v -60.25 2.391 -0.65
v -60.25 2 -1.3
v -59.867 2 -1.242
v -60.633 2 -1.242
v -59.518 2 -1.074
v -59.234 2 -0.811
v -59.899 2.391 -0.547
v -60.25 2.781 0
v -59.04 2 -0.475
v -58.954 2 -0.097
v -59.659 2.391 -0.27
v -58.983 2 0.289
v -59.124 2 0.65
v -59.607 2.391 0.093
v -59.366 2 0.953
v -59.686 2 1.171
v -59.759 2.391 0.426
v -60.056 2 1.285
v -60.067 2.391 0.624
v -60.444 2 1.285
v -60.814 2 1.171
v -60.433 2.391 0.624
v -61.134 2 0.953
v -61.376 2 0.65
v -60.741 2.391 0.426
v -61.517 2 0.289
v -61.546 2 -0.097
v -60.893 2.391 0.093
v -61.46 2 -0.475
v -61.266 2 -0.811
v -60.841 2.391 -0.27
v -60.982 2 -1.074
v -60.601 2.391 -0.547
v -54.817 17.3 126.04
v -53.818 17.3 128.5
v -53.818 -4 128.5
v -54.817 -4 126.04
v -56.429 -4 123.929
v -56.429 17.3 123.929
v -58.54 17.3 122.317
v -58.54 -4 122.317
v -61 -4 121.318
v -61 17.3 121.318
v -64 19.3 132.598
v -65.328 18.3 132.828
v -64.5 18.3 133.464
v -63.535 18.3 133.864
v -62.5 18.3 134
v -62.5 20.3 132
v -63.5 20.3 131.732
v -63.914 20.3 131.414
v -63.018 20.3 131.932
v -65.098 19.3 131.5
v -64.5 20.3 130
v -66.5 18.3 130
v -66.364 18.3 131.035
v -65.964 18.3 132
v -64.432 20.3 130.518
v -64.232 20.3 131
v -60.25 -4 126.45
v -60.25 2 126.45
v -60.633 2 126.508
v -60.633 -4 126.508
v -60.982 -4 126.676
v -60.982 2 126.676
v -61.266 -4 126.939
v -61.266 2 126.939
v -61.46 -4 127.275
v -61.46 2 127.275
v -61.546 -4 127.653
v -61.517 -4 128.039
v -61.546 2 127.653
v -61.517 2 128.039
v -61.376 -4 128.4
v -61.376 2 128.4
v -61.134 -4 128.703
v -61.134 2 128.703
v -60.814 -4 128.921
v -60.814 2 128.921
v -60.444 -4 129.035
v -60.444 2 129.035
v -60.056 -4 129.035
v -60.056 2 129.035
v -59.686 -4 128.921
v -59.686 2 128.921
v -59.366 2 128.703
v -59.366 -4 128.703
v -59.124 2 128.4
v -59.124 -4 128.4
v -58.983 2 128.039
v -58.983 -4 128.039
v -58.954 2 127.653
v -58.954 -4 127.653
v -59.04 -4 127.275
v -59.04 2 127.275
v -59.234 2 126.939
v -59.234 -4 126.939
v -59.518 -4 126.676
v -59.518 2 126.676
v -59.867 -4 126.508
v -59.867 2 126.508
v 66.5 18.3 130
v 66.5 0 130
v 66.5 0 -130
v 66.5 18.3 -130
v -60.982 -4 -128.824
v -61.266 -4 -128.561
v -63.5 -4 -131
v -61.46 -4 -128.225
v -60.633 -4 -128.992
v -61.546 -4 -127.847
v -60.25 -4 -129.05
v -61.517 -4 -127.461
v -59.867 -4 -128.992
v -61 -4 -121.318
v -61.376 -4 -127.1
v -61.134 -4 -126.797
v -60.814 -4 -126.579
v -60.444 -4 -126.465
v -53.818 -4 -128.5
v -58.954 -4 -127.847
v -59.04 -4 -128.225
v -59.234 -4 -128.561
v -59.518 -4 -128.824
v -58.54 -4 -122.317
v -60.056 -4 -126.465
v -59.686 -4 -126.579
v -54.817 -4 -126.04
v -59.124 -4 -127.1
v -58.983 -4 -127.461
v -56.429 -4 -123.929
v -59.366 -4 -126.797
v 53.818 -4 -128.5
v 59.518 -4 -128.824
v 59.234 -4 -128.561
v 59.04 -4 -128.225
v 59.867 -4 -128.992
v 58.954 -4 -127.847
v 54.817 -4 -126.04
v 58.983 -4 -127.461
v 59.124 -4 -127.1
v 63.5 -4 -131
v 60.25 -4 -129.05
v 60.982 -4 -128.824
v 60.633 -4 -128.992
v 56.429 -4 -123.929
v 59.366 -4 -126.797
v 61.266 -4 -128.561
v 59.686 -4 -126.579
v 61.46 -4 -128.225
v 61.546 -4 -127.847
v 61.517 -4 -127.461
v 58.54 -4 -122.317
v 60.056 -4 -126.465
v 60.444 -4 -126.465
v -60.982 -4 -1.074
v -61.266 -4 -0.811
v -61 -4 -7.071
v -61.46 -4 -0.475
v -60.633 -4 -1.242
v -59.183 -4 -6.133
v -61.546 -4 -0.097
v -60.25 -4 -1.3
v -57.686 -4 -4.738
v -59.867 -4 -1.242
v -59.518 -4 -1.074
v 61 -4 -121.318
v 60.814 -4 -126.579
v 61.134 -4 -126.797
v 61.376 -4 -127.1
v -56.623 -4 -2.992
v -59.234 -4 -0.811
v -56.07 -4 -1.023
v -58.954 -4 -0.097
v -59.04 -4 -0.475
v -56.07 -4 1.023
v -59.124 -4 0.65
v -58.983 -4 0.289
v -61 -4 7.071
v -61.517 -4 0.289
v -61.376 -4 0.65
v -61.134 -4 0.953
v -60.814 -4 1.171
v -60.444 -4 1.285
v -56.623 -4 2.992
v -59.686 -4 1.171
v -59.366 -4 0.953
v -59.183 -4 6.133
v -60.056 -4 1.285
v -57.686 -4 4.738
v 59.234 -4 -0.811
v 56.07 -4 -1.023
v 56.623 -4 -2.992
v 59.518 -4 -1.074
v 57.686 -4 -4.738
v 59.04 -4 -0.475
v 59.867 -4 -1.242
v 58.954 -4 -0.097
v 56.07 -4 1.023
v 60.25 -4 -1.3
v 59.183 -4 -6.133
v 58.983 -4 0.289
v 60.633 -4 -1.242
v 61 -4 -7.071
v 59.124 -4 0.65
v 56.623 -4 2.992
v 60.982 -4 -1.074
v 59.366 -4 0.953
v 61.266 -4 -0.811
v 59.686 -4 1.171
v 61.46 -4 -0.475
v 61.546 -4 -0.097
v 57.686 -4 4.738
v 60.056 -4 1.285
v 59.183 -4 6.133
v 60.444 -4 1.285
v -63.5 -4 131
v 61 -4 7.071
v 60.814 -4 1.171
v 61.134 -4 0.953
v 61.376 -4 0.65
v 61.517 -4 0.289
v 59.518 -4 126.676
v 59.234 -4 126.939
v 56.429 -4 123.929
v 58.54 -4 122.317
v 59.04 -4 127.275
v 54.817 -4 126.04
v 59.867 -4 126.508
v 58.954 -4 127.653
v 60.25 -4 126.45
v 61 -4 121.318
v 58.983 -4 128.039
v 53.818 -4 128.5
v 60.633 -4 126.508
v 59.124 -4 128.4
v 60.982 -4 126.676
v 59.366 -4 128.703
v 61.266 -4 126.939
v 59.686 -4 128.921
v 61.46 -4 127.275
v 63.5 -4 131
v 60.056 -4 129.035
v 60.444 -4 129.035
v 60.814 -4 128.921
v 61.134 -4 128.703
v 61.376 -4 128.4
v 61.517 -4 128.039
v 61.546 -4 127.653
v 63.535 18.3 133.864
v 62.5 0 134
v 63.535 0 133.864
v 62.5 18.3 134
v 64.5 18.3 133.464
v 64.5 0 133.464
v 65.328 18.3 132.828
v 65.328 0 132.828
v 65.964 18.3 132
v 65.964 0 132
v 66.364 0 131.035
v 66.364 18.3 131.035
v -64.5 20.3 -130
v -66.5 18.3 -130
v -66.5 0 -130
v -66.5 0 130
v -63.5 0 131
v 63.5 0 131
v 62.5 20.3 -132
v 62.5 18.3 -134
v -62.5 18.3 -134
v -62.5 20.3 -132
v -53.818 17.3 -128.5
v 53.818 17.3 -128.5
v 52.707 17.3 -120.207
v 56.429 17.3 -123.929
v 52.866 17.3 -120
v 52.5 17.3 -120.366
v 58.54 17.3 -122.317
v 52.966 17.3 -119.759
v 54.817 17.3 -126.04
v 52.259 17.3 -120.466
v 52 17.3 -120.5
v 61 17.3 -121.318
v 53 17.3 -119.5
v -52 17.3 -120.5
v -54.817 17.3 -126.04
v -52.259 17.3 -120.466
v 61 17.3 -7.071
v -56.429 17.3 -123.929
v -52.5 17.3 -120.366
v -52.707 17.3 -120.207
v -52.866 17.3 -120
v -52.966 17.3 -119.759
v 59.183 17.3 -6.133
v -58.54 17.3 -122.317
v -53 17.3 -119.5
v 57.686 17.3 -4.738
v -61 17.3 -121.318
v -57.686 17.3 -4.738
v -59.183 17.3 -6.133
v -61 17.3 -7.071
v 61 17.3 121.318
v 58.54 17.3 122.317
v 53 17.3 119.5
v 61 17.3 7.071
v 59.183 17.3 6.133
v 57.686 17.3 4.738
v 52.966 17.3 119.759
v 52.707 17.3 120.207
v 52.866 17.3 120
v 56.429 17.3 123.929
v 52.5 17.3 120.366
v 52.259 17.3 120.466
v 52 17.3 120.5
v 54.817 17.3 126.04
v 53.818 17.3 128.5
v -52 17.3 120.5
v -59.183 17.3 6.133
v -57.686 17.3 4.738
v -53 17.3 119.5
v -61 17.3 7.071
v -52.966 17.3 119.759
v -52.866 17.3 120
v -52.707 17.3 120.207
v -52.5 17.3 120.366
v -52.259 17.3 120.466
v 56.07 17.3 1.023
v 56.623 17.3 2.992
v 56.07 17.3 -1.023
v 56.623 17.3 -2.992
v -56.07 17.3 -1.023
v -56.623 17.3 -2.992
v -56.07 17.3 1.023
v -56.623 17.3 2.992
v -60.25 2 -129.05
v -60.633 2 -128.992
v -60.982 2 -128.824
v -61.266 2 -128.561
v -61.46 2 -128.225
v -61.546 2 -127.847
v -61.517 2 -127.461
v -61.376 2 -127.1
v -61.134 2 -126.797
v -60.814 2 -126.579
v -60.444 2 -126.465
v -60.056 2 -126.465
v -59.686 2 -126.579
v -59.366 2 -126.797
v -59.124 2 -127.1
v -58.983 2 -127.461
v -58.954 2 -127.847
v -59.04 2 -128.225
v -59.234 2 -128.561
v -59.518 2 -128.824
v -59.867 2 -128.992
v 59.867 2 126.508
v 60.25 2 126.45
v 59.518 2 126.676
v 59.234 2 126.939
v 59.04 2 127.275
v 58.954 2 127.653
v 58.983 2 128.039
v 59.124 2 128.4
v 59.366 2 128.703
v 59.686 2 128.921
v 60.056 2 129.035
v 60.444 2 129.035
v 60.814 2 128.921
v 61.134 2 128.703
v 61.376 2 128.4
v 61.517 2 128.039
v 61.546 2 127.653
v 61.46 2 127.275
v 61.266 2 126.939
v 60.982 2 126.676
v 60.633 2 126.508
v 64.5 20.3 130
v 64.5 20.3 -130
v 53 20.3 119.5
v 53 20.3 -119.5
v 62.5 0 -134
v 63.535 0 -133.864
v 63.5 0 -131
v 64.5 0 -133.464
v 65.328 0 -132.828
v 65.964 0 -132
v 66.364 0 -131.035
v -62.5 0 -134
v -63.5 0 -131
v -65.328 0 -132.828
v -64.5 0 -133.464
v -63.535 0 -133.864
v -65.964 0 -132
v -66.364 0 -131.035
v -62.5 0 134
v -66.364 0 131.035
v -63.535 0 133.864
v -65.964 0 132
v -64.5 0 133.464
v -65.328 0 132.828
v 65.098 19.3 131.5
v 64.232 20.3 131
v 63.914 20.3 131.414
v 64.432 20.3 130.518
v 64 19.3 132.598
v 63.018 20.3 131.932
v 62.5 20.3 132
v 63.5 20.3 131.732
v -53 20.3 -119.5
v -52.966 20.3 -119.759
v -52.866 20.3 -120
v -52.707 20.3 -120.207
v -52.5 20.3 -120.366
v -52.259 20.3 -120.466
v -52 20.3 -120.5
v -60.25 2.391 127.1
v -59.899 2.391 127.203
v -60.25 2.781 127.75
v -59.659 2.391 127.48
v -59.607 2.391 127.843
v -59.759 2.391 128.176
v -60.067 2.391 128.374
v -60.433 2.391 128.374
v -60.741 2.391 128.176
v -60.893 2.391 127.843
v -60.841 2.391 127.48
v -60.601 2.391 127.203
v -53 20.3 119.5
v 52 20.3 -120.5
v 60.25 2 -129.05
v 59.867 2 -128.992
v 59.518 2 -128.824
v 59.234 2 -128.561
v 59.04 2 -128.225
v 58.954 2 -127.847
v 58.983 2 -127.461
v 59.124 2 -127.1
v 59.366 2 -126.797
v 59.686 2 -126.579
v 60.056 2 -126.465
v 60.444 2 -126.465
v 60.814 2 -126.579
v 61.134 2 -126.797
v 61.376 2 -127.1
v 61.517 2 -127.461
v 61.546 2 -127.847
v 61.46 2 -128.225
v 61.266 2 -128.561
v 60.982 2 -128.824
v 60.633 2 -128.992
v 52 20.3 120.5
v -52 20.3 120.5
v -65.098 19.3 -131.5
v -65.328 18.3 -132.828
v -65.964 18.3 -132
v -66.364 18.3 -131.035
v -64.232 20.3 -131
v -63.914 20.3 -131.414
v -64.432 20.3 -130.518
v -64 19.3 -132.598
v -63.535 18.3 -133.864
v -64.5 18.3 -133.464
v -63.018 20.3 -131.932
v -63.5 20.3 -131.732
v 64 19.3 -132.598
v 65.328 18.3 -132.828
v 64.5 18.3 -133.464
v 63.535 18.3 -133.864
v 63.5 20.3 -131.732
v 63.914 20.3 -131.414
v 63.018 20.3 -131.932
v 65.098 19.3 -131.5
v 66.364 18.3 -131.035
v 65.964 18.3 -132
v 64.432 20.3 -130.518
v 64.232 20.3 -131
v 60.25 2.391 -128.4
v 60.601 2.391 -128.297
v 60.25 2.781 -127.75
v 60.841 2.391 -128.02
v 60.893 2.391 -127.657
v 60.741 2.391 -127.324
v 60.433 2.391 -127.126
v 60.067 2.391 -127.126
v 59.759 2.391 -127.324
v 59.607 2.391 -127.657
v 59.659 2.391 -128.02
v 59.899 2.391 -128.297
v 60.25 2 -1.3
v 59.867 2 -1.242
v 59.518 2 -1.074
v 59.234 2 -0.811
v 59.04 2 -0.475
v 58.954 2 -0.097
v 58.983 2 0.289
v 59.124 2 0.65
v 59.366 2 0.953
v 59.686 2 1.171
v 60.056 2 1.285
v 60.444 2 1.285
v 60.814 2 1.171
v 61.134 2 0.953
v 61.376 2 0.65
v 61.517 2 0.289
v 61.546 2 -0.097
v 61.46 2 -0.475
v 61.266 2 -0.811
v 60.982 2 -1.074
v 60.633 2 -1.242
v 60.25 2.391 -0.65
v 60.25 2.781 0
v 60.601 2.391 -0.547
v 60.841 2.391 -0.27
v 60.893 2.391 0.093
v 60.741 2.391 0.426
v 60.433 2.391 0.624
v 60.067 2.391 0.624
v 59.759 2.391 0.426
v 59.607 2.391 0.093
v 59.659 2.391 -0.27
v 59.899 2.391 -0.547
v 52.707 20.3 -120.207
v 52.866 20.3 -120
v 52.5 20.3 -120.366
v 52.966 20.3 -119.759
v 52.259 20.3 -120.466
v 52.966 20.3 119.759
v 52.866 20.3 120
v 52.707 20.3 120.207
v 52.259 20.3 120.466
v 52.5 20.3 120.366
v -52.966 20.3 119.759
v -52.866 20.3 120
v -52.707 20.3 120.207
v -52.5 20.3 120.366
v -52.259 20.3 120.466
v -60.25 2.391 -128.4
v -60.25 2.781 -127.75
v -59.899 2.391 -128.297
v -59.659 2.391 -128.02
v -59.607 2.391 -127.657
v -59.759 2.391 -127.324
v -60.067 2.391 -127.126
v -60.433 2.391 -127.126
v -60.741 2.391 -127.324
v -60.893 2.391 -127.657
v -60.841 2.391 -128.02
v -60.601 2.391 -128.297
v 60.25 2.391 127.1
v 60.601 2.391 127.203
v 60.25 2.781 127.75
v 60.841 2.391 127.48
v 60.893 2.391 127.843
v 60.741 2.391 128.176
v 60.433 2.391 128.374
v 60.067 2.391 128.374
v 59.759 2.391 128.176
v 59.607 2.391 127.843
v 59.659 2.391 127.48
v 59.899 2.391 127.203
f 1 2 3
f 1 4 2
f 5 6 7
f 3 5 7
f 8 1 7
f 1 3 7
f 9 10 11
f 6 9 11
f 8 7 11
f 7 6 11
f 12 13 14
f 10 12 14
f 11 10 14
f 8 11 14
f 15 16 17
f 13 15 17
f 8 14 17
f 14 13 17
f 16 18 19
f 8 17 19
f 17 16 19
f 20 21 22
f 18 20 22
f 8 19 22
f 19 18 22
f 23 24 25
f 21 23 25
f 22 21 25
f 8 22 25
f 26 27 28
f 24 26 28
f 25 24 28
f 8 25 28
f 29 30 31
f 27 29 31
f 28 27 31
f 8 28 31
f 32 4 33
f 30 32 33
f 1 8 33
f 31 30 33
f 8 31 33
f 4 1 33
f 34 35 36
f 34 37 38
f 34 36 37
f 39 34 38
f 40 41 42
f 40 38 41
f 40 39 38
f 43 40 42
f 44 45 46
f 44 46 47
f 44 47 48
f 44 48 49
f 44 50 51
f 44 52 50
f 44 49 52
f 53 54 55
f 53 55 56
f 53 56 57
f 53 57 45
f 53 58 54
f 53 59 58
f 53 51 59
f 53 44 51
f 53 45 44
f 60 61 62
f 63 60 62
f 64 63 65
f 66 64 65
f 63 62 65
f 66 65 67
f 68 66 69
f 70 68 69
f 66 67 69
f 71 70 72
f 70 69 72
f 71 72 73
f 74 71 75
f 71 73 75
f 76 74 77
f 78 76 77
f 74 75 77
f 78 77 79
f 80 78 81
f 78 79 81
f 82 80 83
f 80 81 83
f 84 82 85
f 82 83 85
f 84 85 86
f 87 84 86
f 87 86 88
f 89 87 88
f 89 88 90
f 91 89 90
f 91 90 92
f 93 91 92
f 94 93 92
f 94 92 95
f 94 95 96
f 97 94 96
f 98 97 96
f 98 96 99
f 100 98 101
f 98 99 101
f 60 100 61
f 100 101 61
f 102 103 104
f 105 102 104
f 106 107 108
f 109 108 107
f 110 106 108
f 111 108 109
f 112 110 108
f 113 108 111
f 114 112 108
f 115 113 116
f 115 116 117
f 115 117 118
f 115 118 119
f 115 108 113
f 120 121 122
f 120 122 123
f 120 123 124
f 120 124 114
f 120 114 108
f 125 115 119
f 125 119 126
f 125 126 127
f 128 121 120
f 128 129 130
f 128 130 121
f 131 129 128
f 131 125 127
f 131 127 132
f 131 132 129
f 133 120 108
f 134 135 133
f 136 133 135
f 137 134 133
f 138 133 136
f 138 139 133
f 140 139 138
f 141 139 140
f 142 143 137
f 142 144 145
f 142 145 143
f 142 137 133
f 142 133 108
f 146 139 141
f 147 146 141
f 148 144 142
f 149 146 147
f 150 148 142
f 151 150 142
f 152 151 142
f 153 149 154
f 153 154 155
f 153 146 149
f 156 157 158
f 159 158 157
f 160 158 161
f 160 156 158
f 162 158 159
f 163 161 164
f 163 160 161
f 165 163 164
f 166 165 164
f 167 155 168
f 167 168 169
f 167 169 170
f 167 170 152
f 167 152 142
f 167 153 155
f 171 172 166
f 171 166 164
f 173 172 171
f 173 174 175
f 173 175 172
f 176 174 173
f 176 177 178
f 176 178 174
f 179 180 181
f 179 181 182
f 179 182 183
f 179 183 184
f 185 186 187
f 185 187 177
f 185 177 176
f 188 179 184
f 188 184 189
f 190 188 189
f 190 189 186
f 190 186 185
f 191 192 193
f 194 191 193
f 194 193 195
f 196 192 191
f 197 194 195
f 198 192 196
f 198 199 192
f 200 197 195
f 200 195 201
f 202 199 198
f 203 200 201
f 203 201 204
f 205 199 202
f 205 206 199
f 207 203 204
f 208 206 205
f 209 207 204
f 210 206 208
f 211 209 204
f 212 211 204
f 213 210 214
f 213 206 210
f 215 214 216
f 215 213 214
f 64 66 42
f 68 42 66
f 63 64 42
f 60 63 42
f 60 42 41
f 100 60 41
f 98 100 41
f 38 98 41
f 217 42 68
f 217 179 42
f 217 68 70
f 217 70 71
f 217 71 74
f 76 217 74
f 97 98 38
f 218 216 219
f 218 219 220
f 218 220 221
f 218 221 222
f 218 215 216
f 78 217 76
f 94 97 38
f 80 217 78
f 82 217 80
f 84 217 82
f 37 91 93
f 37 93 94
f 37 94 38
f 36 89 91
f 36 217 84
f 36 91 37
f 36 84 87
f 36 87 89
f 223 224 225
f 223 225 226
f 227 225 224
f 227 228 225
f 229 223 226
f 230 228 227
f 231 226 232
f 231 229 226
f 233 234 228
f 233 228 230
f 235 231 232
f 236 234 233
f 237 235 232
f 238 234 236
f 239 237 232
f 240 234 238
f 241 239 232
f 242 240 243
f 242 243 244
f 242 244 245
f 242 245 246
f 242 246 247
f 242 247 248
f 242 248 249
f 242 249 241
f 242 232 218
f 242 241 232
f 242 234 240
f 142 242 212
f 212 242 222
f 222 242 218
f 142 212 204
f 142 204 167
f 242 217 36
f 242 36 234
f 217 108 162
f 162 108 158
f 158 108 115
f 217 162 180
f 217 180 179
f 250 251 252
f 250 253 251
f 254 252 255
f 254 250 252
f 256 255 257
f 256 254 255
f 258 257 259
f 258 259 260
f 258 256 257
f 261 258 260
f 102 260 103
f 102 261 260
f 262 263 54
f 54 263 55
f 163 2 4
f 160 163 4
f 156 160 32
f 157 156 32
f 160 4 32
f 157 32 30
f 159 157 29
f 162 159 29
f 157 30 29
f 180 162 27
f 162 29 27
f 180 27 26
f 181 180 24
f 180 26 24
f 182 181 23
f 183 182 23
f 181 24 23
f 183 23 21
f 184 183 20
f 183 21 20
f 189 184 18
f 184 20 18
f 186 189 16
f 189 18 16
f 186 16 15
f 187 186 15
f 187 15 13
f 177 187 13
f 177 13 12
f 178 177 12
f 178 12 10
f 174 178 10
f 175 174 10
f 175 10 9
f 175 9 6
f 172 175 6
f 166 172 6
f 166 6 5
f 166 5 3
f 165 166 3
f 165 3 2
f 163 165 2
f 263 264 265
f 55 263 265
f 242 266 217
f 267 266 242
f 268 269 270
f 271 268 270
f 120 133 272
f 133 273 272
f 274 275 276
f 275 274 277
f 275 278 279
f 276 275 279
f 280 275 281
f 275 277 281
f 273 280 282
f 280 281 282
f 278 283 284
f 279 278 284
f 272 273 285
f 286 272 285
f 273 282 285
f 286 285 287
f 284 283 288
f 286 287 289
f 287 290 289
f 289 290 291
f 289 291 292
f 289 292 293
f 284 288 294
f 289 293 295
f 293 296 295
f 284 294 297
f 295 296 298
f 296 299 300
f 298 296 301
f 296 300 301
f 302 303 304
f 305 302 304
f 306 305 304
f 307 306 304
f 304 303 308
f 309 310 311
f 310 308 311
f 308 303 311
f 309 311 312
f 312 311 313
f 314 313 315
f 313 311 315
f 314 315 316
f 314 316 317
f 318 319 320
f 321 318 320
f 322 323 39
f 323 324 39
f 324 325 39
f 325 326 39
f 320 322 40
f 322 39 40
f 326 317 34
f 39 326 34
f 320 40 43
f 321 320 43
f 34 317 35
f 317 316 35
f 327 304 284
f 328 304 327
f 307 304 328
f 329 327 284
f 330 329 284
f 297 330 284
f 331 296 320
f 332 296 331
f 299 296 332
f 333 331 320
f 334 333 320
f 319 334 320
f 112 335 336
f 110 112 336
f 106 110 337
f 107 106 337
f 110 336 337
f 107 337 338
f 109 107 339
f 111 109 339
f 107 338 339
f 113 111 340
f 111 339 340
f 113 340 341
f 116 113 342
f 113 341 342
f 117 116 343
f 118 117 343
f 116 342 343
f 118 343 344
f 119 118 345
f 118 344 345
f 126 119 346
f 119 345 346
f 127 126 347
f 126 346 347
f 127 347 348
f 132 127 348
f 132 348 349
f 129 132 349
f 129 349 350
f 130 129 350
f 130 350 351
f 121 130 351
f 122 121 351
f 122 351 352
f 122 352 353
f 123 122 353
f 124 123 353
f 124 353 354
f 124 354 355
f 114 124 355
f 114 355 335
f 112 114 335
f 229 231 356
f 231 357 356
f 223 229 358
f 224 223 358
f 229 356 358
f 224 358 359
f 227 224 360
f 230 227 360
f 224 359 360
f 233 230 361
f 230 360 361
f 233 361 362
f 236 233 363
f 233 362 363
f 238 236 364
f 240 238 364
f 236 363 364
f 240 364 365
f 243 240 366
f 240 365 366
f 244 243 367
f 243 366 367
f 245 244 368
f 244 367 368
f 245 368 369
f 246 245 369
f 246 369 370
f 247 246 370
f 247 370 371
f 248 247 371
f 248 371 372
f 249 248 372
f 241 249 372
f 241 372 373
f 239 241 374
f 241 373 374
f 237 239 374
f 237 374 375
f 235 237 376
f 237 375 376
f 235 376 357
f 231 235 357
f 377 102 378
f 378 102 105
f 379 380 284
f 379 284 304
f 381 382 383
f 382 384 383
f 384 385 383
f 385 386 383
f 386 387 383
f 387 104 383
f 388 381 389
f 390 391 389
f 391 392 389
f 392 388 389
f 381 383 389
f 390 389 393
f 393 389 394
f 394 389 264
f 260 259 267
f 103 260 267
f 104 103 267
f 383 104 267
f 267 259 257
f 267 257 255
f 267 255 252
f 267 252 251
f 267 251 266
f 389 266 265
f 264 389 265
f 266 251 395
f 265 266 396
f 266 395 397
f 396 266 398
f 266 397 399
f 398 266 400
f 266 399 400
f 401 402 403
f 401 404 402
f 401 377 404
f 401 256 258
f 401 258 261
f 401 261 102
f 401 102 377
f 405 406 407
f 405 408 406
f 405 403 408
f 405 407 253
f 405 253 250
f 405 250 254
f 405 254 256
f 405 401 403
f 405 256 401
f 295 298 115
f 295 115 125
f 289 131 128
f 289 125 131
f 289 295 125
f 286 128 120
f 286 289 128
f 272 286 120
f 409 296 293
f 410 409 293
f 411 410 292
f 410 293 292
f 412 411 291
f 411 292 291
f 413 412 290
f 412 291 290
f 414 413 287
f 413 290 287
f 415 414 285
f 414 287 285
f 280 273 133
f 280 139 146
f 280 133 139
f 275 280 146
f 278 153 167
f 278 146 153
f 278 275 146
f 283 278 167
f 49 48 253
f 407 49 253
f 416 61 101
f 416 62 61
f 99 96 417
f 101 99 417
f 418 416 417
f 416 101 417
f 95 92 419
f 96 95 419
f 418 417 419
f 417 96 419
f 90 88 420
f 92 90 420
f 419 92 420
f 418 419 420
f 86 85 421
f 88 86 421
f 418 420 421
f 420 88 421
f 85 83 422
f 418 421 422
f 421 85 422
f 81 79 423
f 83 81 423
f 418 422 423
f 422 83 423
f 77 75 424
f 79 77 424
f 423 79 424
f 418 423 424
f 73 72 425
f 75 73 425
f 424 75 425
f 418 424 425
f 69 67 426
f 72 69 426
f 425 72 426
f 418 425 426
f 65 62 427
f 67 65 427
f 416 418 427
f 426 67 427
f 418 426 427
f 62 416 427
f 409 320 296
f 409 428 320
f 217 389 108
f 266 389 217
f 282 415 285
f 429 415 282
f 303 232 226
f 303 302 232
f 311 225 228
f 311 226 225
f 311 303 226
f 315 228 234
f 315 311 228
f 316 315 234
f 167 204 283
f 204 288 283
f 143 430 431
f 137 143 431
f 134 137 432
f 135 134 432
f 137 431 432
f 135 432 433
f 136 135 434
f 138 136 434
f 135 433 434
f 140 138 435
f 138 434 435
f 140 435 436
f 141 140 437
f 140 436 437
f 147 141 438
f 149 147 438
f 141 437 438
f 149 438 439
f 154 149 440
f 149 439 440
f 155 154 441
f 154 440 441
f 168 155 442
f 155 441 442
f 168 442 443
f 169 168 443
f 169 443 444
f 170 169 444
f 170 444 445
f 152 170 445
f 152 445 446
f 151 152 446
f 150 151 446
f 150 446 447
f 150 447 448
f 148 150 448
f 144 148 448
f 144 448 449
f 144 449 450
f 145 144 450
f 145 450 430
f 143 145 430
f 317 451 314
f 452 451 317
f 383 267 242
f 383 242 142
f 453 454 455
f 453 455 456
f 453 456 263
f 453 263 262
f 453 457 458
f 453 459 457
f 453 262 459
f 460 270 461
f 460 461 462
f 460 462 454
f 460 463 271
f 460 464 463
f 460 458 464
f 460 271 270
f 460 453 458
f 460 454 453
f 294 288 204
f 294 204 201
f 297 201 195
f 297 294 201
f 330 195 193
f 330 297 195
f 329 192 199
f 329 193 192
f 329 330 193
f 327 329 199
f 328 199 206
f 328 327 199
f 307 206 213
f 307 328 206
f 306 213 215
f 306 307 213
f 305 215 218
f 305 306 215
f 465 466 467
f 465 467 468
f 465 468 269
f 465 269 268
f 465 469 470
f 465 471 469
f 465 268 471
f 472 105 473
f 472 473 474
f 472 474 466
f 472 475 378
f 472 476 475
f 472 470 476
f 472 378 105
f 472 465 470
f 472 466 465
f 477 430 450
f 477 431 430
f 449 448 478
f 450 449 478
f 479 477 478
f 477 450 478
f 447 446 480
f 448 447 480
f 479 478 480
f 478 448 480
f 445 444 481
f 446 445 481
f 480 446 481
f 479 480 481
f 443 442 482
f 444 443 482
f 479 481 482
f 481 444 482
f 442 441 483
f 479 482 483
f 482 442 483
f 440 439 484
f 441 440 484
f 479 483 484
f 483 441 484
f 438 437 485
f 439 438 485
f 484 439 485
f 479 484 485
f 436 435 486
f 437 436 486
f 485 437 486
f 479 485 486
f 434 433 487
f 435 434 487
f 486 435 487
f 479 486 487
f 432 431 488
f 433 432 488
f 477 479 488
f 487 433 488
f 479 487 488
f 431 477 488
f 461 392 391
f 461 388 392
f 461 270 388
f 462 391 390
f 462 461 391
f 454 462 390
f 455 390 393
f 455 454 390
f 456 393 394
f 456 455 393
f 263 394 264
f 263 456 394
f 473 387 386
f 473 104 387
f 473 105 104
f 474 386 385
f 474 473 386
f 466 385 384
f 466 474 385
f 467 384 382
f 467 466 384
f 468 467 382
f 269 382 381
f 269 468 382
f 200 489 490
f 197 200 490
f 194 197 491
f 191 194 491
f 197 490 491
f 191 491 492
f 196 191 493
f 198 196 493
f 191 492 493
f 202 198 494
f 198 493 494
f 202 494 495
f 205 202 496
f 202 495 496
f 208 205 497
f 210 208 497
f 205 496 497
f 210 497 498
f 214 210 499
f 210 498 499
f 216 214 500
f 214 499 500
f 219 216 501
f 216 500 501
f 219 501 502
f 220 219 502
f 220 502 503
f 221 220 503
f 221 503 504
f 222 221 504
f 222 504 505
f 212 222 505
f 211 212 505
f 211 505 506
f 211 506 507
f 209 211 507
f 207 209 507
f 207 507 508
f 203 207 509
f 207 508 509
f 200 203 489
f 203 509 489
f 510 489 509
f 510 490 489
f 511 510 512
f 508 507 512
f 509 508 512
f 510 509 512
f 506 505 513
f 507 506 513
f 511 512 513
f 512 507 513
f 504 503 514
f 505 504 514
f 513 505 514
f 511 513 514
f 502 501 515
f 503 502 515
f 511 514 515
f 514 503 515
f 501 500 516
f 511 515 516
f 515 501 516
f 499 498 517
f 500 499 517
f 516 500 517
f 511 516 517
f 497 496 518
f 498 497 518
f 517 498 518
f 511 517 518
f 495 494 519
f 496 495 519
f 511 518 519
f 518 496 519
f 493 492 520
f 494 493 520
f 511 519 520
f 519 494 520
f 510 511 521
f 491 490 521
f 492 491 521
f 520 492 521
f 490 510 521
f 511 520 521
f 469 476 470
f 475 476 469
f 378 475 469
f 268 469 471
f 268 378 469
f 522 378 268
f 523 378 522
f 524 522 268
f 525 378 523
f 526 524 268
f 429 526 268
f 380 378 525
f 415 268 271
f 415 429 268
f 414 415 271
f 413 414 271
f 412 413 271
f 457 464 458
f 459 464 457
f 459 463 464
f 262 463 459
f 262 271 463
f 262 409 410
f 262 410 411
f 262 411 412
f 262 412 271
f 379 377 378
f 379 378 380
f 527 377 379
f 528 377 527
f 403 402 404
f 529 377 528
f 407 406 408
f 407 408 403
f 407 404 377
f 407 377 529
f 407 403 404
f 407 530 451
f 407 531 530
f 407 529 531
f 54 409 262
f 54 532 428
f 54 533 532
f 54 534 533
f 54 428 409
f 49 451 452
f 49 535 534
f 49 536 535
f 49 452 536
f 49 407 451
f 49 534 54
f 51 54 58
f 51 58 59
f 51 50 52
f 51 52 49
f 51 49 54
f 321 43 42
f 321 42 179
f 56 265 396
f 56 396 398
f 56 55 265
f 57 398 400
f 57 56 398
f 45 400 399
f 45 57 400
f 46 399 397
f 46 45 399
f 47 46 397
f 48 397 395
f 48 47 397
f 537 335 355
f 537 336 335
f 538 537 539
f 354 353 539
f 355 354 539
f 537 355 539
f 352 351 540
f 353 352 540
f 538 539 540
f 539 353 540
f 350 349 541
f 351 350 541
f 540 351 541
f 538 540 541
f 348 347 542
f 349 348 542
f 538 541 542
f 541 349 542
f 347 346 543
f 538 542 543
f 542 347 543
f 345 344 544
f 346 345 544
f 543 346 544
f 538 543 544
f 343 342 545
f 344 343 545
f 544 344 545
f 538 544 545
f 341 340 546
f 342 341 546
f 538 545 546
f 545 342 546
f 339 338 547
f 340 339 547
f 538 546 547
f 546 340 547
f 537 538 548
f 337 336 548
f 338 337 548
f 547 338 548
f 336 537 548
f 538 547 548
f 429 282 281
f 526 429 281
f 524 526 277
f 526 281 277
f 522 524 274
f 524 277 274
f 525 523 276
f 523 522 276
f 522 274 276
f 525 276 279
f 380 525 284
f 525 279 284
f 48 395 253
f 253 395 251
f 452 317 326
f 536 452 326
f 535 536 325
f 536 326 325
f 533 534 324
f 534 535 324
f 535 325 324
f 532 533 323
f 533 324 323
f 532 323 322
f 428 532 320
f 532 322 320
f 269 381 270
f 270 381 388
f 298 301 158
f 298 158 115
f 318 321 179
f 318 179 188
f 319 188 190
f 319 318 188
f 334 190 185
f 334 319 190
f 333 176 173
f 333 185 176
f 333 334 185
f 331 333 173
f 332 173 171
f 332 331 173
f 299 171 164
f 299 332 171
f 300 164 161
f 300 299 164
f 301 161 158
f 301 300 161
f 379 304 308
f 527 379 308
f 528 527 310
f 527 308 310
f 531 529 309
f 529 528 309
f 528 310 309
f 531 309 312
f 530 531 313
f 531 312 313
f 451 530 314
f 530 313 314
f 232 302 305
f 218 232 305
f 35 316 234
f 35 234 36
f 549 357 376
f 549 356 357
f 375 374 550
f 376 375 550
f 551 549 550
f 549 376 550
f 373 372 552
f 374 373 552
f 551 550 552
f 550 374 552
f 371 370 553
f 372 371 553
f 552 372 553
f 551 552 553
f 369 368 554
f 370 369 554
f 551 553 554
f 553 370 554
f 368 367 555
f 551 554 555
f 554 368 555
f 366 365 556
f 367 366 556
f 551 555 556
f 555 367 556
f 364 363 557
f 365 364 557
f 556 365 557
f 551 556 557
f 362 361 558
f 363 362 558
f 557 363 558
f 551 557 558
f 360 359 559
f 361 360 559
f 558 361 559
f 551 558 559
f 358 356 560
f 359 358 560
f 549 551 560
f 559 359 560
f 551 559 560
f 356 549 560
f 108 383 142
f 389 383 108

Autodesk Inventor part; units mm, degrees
ref_plane "YZ Plane" through (0, 0, 0) normal (1, 0, 0) x (0, 1, 0)
ref_plane "XZ Plane" through (0, 0, 0) normal (0, 1, 0) x (-1, 0, 0)
ref_plane "XY Plane" through (0, 0, 0) normal (0, 0, 1) x (1, 0, 0)
sketch "Sketch1" plane through (0, 0, 0) normal (0, 1, 0) x (-1, 0, 0)
  line L0 (66.5, 134) -> (-66.5, 134)
  line L1 (-66.5, 134) -> (-66.5, -134)
  line L2 (-66.5, -134) -> (66.5, -134)
  line L3 (66.5, -134) -> (66.5, 134)
  point P0 (0, 0)
  dimension "d0" = 133
  dimension "d1" = 268
  dimension "d2" = 66.5
  dimension "d3" = 134
extrude "Extrusion1" add sketch "Sketch1" along normal blind 20.3
shell "Shell1" thickness 3 removed faces 1 at (-22.1667, 0, -44.6667)
sketch "Sketch2" plane through (0, 20.3, 0) normal (0, 1, 0) x (1, 0, 0)
  line L0 (-53, 120.5) -> (53, 120.5)
  line L1 (53, 120.5) -> (53, -120.5)
  line L2 (53, -120.5) -> (-53, -120.5)
  line L3 (-53, -120.5) -> (-53, 120.5)
  line L4 (-66.5, 134) -> (-66.5, -134) projected
  line L5 (-66.5, -134) -> (66.5, -134) projected
  line L6 (66.5, -134) -> (66.5, 134) projected
  line L7 (66.5, 134) -> (-66.5, 134) projected
  point P0 (0, 0)
  dimension "d7" = 13.5
  dimension "d8" = 13.5
  dimension "d9" = 13.5
  dimension "d10" = 13.5
extrude "Extrusion2" cut sketch "Sketch2" against normal through all contours L0 L1 L2 L3
sketch "Sketch3" plane through (-63.5, 17.3, 131) normal (0, -1, 0) x (1, 0, 0)
  arc A0 (117, 0) -> (127, -10) centre (127, 0) ccw
  line L0 (127, 0) -> (127, -262) projected
  line L1 (0, 0) -> (127, 0) projected
  line L2 (127, -262) -> (0, -262) projected
  arc A1 (127, -252) -> (117, -262) centre (127, -262) ccw
  line L3 (0, -262) -> (0, 0) projected
  arc A2 (0, -10) -> (10, 0) centre (0, 0) ccw
  arc A3 (10, -262) -> (0, -252) centre (0, -262) ccw
  arc A4 (127, -123.5) -> (127, -138.5) centre (127, -131) ccw
  arc A5 (0, -138.5) -> (0, -123.5) centre (0, -131) ccw
  line L4 (127, 0) -> (124.6095, 0)
  line L5 (127, 0) -> (124.5, 0)
  line L6 (124.5, 0) -> (124.5, -262)
  line L7 (124.5, -262) -> (127, -262)
  line L8 (127, -262) -> (127, 0)
  line L9 (0, 0) -> (2.5, 0)
  line L10 (2.5, 0) -> (2.5, -262)
  line L11 (2.5, -262) -> (0, -262)
  line L12 (0, -262) -> (0, 0)
  line L13 (0, -262) -> (0, 0) projected
  line L14 (0, -262) -> (127, -262)
  line L15 (127, -262) -> (127, -259.5)
  line L16 (127, -259.5) -> (0, -259.5)
  line L17 (0, -259.5) -> (0, -262)
  line L18 (0, 0) -> (127, 0)
  line L19 (127, 0) -> (127, -2.5)
  line L20 (127, -2.5) -> (0, -2.5)
  line L21 (0, -2.5) -> (0, 0)
  point P0 (63.5, -131)
  point P1 (9.6825, -259.5)
  point P2 (2.5, -252.3175)
  point P3 (2.5, -138.0711)
  point P4 (2.5, -123.9289)
  point P5 (2.5, -9.6825)
  point P6 (9.6825, -2.5)
  point P7 (117.3175, -2.5)
  point P8 (124.5, -9.6825)
  point P9 (124.5, -123.9289)
  point P10 (124.5, -138.0711)
  point P11 (124.5, -252.3175)
  point P12 (117.3175, -259.5)
  dimension "d13" = 20
  dimension "d14" = 0
  dimension "d15" = 0
  dimension "d16" = 20
  dimension "d17" = 20
  dimension "d18" = 20
  dimension "d19" = 15
  dimension "d20" = 15
  dimension "d21" = 0
  dimension "d22" = 0
  dimension "d24" = 0
  dimension "d25" = 0
  dimension "d28" = 2.5
  dimension "d29" = 0
  dimension "d30" = 0
  dimension "d31" = 0
  dimension "d32" = 2.5
  dimension "d33" = 0
  dimension "d34" = 2.5
  dimension "d35" = 0
  dimension "d36" = 2.5
  dimension "d37" = 0
extrude "Extrusion3" add sketch "Sketch3" along normal blind 21.3 contours L1 L6 L20 A0 | A0 L20 A2 L1 | L20 L6 A0 | A2 L20 L10 L1 | L1 L0 L20 L6 | L6 L20 L0 A0 | A0 L0 A4 L6 | A2 L10 L20 | L10 L20 L3 L1 | L6 A4 | A4 L0 L6 | L10 A5 L3 A2 | A2 L3 L20 L10 | A4 L0 A1 L6 | L10 A5 L3 | A5 L10 | L6 L16 A1 | A1 L0 L16 L6 | L10 A3 L3 A5 | L16 L6 L2 A1 | A1 L2 A3 L16 | L16 L0 L2 L6 | L10 L16 L3 A3 | A3 L16 L10 | A3 L2 L10 L16 | L10 L2 L3 L16
fillet "Fillet2" radius 4 4 edges at (-66.5, 10.15, -134) (-66.5, 10.15, 134) (66.5, 10.15, 134) (66.5, 10.15, -134)
fillet "Fillet3" radius 1 4 edges at (53, 18.8, 120.5) (53, 18.8, -120.5) (-53, 18.8, -120.5) (-53, 18.8, 120.5)
chamfer "Chamfer1" distance 2 angle 45 8 edges at (0, 20.3, 134) (65.3284, 20.3, 132.8284) (66.5, 20.3, 0) (65.3284, 20.3, -132.8284) (0, 20.3, -134) (-65.3284, 20.3, -132.8284) (-66.5, 20.3, 0) (-65.3284, 20.3, 132.8284)
sketch "Sketch4" plane through (-63.5, -4, 131) normal (0, -1, 0) x (1, 0, 0)
  circle A0 centre (123.75, -258.75) radius 1.75 projected
  circle A1 centre (3.25, -258.75) radius 1.75 projected
  circle A2 centre (3.25, -3.25) radius 1.75 projected
  circle A3 centre (123.75, -3.25) radius 1.75 projected
  circle A4 centre (123.75, -131) radius 1.75 projected
  circle A5 centre (3.25, -131) radius 1.75 projected
  point P0 (63.5, -131)
hole "Hole1" at (-60.25, -4, 127.75) at (60.25, -4, 127.75) at (60.25, -4, 0) at (60.25, -4, -127.75) at (-60.25, -4, -127.75) at (-60.25, -4, 0) direction (0, 1, 0) diameter 2.6 depth 6 tip angle 118
properties part number "Cover"
